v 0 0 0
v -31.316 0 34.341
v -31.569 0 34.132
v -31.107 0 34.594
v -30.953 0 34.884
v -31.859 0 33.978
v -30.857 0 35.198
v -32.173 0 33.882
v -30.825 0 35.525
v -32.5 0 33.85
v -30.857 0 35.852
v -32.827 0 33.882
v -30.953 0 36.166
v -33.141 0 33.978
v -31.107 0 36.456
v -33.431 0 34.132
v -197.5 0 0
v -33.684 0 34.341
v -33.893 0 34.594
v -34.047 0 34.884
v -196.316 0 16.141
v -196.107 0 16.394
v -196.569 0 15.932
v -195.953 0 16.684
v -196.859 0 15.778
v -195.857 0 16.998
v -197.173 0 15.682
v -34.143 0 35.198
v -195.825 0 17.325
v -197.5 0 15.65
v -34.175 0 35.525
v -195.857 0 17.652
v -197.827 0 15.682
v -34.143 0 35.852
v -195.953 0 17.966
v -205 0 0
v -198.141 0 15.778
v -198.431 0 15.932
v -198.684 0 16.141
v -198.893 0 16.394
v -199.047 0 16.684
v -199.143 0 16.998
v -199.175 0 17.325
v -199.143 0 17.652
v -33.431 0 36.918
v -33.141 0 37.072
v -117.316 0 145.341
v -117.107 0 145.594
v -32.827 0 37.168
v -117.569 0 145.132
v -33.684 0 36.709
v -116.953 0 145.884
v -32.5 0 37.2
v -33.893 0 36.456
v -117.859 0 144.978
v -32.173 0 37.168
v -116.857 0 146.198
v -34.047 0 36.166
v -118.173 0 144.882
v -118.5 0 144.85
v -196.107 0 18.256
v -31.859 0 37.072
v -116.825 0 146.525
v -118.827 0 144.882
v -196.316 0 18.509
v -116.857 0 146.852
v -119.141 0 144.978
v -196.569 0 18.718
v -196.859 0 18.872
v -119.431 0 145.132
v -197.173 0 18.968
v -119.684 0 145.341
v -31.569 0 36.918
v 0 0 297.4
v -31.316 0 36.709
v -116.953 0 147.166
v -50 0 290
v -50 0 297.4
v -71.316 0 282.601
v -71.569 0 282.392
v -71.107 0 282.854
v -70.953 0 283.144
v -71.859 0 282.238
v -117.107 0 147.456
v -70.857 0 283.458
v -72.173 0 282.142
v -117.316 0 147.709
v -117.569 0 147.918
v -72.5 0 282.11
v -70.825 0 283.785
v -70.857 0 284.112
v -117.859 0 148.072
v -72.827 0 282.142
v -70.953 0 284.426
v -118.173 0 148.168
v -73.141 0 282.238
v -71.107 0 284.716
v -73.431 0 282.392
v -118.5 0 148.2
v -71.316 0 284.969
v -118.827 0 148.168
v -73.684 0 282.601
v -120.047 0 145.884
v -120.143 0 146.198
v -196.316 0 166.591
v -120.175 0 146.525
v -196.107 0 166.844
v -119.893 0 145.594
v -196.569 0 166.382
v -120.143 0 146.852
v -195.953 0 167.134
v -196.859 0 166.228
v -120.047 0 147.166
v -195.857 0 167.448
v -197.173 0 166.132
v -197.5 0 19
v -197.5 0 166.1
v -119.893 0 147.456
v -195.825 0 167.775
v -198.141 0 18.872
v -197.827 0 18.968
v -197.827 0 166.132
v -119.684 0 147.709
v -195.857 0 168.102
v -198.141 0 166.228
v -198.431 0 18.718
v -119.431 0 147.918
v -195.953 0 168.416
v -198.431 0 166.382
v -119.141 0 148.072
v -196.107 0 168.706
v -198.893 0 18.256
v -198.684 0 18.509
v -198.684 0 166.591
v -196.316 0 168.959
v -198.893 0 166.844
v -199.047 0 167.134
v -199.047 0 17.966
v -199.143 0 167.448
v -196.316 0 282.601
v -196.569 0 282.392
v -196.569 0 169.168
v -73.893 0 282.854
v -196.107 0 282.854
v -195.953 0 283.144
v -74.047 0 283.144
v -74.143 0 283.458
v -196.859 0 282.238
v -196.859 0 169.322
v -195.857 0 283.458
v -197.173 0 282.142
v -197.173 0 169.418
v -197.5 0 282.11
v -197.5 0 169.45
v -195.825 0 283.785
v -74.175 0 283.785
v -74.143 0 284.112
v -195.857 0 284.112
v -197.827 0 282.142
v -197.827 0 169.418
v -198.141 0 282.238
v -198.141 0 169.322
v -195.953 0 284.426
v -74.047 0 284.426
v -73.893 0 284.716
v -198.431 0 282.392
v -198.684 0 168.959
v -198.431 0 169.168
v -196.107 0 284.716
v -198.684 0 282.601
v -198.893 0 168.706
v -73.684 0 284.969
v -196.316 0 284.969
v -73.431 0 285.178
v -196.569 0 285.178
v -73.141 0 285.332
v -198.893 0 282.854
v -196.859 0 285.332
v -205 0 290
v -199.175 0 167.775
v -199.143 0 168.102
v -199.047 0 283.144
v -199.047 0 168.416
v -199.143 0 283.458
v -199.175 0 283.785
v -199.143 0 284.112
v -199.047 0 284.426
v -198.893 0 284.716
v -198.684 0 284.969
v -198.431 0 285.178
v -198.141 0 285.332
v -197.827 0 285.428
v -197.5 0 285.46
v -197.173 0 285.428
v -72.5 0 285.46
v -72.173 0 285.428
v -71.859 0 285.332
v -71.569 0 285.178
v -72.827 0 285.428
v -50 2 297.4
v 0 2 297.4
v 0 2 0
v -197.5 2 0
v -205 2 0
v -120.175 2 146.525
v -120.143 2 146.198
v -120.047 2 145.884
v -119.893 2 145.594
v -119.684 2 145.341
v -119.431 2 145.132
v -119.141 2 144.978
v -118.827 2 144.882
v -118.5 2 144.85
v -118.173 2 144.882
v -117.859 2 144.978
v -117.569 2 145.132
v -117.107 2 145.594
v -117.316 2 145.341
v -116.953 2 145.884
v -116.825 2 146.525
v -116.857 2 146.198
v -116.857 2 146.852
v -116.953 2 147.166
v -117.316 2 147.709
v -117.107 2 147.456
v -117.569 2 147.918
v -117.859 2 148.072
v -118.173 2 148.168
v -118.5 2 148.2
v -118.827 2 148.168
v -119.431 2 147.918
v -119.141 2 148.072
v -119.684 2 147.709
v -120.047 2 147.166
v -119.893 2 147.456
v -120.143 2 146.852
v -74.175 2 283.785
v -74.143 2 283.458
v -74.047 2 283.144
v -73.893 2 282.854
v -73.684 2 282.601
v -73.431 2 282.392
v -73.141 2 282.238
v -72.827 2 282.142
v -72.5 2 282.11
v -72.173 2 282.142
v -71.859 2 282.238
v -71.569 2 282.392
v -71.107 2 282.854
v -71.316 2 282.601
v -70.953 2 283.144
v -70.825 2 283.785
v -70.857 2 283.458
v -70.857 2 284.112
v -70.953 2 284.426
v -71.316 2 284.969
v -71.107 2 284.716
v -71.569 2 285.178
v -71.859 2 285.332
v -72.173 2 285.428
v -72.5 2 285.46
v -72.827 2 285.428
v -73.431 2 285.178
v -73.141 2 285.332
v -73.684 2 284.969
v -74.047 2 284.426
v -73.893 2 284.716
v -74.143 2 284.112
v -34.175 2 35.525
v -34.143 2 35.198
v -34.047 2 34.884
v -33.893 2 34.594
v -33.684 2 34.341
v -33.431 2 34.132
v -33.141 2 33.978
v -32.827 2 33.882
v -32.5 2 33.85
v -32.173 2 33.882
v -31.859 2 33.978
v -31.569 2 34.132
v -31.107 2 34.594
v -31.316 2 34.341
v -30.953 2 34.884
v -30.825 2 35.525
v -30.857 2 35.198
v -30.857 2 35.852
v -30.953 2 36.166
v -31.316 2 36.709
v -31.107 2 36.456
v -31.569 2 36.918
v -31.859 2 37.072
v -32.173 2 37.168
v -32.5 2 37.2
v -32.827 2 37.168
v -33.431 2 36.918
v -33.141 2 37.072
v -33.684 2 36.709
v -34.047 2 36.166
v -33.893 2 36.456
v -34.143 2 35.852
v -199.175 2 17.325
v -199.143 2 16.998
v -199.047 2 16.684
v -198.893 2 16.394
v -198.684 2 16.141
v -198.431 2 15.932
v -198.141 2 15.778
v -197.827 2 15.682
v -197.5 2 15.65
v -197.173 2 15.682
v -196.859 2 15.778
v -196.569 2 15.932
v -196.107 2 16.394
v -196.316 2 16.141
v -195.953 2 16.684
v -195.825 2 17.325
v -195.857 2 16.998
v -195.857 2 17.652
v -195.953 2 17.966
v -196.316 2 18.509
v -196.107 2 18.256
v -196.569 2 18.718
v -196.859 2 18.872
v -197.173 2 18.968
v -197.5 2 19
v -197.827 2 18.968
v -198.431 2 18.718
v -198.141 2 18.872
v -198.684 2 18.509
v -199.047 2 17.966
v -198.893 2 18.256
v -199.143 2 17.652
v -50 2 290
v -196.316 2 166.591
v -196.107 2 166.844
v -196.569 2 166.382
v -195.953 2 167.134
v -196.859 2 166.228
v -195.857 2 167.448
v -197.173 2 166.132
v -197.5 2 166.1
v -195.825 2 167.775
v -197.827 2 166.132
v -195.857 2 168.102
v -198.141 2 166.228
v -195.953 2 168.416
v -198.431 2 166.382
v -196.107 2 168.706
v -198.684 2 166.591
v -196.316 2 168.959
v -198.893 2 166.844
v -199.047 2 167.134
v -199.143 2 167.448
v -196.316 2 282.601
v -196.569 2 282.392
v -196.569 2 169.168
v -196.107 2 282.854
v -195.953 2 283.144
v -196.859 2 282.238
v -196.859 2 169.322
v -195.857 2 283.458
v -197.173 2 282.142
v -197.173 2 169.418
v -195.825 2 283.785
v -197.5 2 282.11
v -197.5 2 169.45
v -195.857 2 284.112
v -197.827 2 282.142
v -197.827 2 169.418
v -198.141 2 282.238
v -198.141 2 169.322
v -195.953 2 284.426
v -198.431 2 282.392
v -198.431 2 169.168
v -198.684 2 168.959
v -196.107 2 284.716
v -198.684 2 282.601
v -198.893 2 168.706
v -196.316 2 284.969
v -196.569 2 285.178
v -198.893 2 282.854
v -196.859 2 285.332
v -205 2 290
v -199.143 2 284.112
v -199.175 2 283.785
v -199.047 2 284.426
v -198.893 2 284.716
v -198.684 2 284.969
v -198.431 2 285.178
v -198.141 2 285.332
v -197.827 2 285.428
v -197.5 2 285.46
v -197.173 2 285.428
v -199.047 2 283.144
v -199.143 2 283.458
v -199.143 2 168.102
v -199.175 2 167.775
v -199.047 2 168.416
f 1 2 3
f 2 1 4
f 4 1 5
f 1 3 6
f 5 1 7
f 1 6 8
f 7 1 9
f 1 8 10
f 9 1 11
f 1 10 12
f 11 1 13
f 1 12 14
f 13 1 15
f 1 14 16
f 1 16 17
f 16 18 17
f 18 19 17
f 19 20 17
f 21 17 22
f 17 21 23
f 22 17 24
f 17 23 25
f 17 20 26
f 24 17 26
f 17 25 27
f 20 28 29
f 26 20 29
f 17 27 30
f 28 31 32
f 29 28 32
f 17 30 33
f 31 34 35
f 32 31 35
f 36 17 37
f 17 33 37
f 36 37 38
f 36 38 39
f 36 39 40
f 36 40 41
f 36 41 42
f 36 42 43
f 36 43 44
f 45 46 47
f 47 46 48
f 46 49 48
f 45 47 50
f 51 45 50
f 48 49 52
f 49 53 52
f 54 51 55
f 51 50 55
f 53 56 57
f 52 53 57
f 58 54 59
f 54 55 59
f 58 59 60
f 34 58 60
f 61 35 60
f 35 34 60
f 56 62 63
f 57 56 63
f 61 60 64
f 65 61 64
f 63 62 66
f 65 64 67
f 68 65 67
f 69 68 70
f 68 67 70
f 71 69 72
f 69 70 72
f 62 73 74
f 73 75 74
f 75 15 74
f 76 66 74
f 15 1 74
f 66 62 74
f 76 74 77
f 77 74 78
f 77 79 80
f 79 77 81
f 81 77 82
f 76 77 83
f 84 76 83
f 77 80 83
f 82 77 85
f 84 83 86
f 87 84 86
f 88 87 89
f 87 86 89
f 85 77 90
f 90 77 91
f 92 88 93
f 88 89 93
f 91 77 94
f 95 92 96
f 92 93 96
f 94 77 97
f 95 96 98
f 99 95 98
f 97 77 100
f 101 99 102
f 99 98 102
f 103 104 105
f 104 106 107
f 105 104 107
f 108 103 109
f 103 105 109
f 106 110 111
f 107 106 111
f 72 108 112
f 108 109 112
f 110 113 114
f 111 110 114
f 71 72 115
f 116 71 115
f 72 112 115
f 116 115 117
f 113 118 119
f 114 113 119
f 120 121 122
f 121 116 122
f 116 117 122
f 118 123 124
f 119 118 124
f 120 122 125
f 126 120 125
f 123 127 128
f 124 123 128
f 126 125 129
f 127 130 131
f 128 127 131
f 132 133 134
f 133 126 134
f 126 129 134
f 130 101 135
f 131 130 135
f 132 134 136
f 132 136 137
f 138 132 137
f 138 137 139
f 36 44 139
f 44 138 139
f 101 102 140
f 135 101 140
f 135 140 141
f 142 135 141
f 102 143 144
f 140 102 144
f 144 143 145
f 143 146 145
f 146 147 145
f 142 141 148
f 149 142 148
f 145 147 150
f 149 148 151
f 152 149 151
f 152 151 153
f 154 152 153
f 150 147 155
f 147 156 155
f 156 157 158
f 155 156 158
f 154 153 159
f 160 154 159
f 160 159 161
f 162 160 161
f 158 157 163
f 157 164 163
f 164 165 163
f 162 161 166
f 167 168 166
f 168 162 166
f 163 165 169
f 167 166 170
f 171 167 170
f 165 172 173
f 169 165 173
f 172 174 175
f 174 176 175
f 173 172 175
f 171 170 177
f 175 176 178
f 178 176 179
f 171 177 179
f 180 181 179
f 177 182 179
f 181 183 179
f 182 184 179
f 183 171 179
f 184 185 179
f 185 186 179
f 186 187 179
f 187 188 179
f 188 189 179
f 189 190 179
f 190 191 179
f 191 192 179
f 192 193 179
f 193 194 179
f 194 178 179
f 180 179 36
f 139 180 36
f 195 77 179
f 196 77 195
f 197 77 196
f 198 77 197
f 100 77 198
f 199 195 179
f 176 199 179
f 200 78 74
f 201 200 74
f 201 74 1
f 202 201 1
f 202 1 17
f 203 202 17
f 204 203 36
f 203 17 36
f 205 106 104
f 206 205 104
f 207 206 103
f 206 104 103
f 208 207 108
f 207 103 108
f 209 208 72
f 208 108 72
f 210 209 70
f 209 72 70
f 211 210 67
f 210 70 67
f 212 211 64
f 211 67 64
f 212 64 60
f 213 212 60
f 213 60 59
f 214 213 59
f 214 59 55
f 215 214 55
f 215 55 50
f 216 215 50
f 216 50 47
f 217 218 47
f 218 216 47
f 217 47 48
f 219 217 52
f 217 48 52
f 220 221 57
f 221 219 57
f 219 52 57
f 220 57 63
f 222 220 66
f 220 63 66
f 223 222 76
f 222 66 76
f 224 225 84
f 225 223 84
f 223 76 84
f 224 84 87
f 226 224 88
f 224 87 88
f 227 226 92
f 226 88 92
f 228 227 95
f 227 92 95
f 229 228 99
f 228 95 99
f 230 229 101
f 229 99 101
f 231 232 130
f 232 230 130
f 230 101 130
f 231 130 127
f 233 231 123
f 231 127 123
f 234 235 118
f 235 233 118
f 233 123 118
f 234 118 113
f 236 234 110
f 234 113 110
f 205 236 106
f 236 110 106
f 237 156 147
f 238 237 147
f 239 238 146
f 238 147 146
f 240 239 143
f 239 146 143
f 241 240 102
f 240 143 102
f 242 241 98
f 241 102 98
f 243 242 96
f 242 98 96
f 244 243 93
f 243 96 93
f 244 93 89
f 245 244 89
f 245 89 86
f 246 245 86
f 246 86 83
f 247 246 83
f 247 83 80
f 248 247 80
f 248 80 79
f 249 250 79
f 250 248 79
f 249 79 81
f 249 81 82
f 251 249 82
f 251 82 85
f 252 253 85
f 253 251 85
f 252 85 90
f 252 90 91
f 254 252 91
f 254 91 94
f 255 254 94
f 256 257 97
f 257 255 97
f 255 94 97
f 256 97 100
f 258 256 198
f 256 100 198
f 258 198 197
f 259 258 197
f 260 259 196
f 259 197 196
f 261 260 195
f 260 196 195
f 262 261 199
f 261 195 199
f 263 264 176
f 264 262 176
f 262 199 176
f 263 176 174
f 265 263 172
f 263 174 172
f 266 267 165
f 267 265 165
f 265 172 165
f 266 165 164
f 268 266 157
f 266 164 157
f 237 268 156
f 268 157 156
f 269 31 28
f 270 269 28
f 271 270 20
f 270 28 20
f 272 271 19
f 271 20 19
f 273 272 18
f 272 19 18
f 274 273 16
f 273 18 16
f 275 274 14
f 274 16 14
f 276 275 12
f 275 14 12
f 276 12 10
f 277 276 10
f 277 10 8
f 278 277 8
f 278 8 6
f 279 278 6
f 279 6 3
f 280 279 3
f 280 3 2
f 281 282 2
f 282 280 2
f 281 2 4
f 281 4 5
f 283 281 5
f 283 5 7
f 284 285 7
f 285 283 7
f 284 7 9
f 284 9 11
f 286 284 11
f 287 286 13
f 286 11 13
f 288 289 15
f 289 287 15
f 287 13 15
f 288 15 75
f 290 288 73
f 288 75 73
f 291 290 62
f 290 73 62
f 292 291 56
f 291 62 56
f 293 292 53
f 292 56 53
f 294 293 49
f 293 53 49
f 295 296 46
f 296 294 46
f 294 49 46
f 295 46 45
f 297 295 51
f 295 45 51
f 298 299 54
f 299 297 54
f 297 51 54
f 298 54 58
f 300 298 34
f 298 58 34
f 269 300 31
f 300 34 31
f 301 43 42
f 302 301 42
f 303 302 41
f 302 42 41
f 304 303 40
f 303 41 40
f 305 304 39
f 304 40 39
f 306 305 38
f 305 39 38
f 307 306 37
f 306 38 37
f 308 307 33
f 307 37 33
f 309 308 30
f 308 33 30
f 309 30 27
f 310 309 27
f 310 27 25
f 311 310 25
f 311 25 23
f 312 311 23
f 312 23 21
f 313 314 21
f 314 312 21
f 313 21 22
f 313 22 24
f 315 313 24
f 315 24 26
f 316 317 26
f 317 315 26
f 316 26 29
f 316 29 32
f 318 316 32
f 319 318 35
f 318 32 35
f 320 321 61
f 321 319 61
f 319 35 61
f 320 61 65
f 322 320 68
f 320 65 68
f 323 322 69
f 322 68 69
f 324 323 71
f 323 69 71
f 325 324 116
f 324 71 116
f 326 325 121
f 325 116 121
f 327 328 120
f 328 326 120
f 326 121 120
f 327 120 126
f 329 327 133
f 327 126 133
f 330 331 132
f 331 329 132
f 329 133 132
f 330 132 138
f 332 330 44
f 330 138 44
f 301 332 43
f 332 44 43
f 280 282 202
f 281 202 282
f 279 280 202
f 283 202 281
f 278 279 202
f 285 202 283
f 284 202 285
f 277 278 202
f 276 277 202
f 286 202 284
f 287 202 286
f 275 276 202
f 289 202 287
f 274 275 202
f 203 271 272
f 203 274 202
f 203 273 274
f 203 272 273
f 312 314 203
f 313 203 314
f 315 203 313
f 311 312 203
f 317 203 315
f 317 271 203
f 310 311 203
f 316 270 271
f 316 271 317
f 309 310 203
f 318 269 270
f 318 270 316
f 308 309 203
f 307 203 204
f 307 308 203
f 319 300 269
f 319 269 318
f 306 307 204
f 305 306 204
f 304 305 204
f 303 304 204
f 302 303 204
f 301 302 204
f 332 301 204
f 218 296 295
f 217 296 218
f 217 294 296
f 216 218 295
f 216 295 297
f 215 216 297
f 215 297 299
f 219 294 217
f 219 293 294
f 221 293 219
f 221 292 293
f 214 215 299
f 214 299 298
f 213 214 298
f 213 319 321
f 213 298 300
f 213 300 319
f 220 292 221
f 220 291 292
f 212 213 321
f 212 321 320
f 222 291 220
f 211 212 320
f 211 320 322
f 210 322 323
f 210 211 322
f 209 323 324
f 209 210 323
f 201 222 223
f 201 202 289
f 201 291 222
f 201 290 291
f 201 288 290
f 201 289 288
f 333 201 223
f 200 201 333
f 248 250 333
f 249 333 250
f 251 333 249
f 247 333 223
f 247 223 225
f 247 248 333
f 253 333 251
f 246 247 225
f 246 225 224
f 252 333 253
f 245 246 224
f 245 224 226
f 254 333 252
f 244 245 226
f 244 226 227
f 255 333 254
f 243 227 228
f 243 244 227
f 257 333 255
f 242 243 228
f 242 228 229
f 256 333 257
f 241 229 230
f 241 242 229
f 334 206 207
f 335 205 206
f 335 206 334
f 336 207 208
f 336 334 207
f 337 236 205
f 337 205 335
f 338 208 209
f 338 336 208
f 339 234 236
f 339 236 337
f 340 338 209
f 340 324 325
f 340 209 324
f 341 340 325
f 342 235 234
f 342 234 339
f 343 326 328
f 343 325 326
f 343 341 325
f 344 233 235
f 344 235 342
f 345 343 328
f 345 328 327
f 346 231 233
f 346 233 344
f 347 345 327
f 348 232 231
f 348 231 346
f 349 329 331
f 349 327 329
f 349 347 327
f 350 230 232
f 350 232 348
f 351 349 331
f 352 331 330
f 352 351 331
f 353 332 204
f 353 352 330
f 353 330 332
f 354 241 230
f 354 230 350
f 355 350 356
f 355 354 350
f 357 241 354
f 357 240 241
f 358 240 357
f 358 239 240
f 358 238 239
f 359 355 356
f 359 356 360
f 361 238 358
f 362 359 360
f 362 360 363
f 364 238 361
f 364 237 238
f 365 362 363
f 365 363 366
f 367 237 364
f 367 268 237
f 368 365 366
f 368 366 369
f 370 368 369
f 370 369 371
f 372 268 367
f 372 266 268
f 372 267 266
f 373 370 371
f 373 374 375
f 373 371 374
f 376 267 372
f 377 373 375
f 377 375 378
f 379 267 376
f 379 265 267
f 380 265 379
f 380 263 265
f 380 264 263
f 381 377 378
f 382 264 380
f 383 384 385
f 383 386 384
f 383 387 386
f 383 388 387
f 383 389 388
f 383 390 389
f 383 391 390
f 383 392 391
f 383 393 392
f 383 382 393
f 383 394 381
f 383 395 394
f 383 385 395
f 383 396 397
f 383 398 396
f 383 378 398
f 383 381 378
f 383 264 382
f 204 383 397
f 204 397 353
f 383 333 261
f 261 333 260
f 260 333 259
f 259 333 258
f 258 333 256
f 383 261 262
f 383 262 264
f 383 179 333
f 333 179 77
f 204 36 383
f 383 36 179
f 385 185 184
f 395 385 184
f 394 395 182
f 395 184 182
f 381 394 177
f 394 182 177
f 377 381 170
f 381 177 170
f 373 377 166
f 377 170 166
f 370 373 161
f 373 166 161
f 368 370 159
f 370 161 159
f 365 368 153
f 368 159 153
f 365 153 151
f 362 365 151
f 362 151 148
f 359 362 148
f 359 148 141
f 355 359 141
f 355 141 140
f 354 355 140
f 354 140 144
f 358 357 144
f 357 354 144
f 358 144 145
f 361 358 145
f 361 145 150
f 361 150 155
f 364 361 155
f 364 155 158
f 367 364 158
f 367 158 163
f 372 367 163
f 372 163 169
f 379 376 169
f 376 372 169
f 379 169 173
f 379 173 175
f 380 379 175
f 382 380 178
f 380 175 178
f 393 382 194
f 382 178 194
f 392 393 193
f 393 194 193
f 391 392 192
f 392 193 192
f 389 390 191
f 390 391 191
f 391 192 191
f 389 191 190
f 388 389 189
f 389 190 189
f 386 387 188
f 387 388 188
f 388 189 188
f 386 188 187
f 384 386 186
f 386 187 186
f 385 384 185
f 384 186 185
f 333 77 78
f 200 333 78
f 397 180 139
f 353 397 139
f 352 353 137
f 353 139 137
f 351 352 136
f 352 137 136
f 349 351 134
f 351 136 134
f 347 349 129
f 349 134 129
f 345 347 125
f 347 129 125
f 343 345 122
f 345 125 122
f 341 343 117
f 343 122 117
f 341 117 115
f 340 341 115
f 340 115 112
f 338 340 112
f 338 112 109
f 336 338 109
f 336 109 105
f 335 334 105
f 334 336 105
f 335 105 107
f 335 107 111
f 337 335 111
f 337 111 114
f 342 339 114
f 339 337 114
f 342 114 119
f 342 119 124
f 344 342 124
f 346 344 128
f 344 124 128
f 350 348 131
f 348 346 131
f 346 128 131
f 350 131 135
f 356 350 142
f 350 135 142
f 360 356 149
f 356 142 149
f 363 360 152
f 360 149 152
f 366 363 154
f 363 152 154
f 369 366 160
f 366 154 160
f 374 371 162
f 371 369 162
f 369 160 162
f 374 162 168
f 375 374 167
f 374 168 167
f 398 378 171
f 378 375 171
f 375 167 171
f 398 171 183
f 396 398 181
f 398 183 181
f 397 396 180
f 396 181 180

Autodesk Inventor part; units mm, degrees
ref_plane "YZ Plane" through (0, 0, 0) normal (1, 0, 0) x (0, 1, 0)
ref_plane "XZ Plane" through (0, 0, 0) normal (0, 1, 0) x (-1, 0, 0)
ref_plane "XY Plane" through (0, 0, 0) normal (0, 0, 1) x (1, 0, 0)
sketch "Sketch1" plane through (0, 0, 0) normal (0, 1, 0) x (-1, 0, 0)
  line L0 (0, 0) -> (205, 0)
  line L1 (205, 0) -> (205, 290)
  line L2 (205, 290) -> (0, 290)
  line L3 (0, 290) -> (0, 0)
  line L4 (0, 290) -> (50, 290)
  line L5 (50, 290) -> (50, 297.4)
  line L6 (50, 297.4) -> (0, 297.4)
  line L7 (0, 297.4) -> (0, 290)
  line L8 (205, 0) -> (197.5, 0)
  line L9 (197.5, 0) -> (197.5, 17.325)
  circle A0 centre (197.5, 17.325) radius 1.675
  line L10 (197.5, 17.325) -> (197.5, 154.225)
  line L11 (197.5, 154.225) -> (197.5, 167.775)
  circle A1 centre (197.5, 167.775) radius 1.675
  line L12 (197.5, 167.775) -> (197.5, 283.785)
  circle A2 centre (197.5, 283.785) radius 1.675
  line L13 (197.5, 167.775) -> (197.5, 146.525)
  line L14 (197.5, 146.525) -> (118.5, 146.525)
  circle A3 centre (118.5, 146.525) radius 1.675
  line L15 (197.5, 283.785) -> (72.5, 283.785)
  circle A4 centre (72.5, 283.785) radius 1.675
  line L16 (197.5, 17.325) -> (197.5, 38.875)
  line L17 (197.5, 38.875) -> (32.5, 38.875)
  line L18 (32.5, 38.875) -> (32.5, 35.525)
  circle A5 centre (32.5, 35.525) radius 1.675
  dimension "d0" = 205
  dimension "d1" = 290
  dimension "d2" = 50
  dimension "d3" = 7.4
  dimension "d4" = 7.5
  dimension "d5" = 17.325
  dimension "d6" = 3.35
  dimension "d7" = 136.9
  dimension "d8" = 13.55
  dimension "d9" = 3.35
  dimension "d10" = 116.01
  dimension "d11" = 3.35
  dimension "d12" = 21.25
  dimension "d13" = 79
  dimension "d14" = 3.35
  dimension "d15" = 125
  dimension "d16" = 3.35
  dimension "d17" = 21.55
  dimension "d18" = 165
  dimension "d24" = 3.35
extrude "Extrusion2" add sketch "Sketch1" along normal blind 2
properties part number "base_main_pcb"
